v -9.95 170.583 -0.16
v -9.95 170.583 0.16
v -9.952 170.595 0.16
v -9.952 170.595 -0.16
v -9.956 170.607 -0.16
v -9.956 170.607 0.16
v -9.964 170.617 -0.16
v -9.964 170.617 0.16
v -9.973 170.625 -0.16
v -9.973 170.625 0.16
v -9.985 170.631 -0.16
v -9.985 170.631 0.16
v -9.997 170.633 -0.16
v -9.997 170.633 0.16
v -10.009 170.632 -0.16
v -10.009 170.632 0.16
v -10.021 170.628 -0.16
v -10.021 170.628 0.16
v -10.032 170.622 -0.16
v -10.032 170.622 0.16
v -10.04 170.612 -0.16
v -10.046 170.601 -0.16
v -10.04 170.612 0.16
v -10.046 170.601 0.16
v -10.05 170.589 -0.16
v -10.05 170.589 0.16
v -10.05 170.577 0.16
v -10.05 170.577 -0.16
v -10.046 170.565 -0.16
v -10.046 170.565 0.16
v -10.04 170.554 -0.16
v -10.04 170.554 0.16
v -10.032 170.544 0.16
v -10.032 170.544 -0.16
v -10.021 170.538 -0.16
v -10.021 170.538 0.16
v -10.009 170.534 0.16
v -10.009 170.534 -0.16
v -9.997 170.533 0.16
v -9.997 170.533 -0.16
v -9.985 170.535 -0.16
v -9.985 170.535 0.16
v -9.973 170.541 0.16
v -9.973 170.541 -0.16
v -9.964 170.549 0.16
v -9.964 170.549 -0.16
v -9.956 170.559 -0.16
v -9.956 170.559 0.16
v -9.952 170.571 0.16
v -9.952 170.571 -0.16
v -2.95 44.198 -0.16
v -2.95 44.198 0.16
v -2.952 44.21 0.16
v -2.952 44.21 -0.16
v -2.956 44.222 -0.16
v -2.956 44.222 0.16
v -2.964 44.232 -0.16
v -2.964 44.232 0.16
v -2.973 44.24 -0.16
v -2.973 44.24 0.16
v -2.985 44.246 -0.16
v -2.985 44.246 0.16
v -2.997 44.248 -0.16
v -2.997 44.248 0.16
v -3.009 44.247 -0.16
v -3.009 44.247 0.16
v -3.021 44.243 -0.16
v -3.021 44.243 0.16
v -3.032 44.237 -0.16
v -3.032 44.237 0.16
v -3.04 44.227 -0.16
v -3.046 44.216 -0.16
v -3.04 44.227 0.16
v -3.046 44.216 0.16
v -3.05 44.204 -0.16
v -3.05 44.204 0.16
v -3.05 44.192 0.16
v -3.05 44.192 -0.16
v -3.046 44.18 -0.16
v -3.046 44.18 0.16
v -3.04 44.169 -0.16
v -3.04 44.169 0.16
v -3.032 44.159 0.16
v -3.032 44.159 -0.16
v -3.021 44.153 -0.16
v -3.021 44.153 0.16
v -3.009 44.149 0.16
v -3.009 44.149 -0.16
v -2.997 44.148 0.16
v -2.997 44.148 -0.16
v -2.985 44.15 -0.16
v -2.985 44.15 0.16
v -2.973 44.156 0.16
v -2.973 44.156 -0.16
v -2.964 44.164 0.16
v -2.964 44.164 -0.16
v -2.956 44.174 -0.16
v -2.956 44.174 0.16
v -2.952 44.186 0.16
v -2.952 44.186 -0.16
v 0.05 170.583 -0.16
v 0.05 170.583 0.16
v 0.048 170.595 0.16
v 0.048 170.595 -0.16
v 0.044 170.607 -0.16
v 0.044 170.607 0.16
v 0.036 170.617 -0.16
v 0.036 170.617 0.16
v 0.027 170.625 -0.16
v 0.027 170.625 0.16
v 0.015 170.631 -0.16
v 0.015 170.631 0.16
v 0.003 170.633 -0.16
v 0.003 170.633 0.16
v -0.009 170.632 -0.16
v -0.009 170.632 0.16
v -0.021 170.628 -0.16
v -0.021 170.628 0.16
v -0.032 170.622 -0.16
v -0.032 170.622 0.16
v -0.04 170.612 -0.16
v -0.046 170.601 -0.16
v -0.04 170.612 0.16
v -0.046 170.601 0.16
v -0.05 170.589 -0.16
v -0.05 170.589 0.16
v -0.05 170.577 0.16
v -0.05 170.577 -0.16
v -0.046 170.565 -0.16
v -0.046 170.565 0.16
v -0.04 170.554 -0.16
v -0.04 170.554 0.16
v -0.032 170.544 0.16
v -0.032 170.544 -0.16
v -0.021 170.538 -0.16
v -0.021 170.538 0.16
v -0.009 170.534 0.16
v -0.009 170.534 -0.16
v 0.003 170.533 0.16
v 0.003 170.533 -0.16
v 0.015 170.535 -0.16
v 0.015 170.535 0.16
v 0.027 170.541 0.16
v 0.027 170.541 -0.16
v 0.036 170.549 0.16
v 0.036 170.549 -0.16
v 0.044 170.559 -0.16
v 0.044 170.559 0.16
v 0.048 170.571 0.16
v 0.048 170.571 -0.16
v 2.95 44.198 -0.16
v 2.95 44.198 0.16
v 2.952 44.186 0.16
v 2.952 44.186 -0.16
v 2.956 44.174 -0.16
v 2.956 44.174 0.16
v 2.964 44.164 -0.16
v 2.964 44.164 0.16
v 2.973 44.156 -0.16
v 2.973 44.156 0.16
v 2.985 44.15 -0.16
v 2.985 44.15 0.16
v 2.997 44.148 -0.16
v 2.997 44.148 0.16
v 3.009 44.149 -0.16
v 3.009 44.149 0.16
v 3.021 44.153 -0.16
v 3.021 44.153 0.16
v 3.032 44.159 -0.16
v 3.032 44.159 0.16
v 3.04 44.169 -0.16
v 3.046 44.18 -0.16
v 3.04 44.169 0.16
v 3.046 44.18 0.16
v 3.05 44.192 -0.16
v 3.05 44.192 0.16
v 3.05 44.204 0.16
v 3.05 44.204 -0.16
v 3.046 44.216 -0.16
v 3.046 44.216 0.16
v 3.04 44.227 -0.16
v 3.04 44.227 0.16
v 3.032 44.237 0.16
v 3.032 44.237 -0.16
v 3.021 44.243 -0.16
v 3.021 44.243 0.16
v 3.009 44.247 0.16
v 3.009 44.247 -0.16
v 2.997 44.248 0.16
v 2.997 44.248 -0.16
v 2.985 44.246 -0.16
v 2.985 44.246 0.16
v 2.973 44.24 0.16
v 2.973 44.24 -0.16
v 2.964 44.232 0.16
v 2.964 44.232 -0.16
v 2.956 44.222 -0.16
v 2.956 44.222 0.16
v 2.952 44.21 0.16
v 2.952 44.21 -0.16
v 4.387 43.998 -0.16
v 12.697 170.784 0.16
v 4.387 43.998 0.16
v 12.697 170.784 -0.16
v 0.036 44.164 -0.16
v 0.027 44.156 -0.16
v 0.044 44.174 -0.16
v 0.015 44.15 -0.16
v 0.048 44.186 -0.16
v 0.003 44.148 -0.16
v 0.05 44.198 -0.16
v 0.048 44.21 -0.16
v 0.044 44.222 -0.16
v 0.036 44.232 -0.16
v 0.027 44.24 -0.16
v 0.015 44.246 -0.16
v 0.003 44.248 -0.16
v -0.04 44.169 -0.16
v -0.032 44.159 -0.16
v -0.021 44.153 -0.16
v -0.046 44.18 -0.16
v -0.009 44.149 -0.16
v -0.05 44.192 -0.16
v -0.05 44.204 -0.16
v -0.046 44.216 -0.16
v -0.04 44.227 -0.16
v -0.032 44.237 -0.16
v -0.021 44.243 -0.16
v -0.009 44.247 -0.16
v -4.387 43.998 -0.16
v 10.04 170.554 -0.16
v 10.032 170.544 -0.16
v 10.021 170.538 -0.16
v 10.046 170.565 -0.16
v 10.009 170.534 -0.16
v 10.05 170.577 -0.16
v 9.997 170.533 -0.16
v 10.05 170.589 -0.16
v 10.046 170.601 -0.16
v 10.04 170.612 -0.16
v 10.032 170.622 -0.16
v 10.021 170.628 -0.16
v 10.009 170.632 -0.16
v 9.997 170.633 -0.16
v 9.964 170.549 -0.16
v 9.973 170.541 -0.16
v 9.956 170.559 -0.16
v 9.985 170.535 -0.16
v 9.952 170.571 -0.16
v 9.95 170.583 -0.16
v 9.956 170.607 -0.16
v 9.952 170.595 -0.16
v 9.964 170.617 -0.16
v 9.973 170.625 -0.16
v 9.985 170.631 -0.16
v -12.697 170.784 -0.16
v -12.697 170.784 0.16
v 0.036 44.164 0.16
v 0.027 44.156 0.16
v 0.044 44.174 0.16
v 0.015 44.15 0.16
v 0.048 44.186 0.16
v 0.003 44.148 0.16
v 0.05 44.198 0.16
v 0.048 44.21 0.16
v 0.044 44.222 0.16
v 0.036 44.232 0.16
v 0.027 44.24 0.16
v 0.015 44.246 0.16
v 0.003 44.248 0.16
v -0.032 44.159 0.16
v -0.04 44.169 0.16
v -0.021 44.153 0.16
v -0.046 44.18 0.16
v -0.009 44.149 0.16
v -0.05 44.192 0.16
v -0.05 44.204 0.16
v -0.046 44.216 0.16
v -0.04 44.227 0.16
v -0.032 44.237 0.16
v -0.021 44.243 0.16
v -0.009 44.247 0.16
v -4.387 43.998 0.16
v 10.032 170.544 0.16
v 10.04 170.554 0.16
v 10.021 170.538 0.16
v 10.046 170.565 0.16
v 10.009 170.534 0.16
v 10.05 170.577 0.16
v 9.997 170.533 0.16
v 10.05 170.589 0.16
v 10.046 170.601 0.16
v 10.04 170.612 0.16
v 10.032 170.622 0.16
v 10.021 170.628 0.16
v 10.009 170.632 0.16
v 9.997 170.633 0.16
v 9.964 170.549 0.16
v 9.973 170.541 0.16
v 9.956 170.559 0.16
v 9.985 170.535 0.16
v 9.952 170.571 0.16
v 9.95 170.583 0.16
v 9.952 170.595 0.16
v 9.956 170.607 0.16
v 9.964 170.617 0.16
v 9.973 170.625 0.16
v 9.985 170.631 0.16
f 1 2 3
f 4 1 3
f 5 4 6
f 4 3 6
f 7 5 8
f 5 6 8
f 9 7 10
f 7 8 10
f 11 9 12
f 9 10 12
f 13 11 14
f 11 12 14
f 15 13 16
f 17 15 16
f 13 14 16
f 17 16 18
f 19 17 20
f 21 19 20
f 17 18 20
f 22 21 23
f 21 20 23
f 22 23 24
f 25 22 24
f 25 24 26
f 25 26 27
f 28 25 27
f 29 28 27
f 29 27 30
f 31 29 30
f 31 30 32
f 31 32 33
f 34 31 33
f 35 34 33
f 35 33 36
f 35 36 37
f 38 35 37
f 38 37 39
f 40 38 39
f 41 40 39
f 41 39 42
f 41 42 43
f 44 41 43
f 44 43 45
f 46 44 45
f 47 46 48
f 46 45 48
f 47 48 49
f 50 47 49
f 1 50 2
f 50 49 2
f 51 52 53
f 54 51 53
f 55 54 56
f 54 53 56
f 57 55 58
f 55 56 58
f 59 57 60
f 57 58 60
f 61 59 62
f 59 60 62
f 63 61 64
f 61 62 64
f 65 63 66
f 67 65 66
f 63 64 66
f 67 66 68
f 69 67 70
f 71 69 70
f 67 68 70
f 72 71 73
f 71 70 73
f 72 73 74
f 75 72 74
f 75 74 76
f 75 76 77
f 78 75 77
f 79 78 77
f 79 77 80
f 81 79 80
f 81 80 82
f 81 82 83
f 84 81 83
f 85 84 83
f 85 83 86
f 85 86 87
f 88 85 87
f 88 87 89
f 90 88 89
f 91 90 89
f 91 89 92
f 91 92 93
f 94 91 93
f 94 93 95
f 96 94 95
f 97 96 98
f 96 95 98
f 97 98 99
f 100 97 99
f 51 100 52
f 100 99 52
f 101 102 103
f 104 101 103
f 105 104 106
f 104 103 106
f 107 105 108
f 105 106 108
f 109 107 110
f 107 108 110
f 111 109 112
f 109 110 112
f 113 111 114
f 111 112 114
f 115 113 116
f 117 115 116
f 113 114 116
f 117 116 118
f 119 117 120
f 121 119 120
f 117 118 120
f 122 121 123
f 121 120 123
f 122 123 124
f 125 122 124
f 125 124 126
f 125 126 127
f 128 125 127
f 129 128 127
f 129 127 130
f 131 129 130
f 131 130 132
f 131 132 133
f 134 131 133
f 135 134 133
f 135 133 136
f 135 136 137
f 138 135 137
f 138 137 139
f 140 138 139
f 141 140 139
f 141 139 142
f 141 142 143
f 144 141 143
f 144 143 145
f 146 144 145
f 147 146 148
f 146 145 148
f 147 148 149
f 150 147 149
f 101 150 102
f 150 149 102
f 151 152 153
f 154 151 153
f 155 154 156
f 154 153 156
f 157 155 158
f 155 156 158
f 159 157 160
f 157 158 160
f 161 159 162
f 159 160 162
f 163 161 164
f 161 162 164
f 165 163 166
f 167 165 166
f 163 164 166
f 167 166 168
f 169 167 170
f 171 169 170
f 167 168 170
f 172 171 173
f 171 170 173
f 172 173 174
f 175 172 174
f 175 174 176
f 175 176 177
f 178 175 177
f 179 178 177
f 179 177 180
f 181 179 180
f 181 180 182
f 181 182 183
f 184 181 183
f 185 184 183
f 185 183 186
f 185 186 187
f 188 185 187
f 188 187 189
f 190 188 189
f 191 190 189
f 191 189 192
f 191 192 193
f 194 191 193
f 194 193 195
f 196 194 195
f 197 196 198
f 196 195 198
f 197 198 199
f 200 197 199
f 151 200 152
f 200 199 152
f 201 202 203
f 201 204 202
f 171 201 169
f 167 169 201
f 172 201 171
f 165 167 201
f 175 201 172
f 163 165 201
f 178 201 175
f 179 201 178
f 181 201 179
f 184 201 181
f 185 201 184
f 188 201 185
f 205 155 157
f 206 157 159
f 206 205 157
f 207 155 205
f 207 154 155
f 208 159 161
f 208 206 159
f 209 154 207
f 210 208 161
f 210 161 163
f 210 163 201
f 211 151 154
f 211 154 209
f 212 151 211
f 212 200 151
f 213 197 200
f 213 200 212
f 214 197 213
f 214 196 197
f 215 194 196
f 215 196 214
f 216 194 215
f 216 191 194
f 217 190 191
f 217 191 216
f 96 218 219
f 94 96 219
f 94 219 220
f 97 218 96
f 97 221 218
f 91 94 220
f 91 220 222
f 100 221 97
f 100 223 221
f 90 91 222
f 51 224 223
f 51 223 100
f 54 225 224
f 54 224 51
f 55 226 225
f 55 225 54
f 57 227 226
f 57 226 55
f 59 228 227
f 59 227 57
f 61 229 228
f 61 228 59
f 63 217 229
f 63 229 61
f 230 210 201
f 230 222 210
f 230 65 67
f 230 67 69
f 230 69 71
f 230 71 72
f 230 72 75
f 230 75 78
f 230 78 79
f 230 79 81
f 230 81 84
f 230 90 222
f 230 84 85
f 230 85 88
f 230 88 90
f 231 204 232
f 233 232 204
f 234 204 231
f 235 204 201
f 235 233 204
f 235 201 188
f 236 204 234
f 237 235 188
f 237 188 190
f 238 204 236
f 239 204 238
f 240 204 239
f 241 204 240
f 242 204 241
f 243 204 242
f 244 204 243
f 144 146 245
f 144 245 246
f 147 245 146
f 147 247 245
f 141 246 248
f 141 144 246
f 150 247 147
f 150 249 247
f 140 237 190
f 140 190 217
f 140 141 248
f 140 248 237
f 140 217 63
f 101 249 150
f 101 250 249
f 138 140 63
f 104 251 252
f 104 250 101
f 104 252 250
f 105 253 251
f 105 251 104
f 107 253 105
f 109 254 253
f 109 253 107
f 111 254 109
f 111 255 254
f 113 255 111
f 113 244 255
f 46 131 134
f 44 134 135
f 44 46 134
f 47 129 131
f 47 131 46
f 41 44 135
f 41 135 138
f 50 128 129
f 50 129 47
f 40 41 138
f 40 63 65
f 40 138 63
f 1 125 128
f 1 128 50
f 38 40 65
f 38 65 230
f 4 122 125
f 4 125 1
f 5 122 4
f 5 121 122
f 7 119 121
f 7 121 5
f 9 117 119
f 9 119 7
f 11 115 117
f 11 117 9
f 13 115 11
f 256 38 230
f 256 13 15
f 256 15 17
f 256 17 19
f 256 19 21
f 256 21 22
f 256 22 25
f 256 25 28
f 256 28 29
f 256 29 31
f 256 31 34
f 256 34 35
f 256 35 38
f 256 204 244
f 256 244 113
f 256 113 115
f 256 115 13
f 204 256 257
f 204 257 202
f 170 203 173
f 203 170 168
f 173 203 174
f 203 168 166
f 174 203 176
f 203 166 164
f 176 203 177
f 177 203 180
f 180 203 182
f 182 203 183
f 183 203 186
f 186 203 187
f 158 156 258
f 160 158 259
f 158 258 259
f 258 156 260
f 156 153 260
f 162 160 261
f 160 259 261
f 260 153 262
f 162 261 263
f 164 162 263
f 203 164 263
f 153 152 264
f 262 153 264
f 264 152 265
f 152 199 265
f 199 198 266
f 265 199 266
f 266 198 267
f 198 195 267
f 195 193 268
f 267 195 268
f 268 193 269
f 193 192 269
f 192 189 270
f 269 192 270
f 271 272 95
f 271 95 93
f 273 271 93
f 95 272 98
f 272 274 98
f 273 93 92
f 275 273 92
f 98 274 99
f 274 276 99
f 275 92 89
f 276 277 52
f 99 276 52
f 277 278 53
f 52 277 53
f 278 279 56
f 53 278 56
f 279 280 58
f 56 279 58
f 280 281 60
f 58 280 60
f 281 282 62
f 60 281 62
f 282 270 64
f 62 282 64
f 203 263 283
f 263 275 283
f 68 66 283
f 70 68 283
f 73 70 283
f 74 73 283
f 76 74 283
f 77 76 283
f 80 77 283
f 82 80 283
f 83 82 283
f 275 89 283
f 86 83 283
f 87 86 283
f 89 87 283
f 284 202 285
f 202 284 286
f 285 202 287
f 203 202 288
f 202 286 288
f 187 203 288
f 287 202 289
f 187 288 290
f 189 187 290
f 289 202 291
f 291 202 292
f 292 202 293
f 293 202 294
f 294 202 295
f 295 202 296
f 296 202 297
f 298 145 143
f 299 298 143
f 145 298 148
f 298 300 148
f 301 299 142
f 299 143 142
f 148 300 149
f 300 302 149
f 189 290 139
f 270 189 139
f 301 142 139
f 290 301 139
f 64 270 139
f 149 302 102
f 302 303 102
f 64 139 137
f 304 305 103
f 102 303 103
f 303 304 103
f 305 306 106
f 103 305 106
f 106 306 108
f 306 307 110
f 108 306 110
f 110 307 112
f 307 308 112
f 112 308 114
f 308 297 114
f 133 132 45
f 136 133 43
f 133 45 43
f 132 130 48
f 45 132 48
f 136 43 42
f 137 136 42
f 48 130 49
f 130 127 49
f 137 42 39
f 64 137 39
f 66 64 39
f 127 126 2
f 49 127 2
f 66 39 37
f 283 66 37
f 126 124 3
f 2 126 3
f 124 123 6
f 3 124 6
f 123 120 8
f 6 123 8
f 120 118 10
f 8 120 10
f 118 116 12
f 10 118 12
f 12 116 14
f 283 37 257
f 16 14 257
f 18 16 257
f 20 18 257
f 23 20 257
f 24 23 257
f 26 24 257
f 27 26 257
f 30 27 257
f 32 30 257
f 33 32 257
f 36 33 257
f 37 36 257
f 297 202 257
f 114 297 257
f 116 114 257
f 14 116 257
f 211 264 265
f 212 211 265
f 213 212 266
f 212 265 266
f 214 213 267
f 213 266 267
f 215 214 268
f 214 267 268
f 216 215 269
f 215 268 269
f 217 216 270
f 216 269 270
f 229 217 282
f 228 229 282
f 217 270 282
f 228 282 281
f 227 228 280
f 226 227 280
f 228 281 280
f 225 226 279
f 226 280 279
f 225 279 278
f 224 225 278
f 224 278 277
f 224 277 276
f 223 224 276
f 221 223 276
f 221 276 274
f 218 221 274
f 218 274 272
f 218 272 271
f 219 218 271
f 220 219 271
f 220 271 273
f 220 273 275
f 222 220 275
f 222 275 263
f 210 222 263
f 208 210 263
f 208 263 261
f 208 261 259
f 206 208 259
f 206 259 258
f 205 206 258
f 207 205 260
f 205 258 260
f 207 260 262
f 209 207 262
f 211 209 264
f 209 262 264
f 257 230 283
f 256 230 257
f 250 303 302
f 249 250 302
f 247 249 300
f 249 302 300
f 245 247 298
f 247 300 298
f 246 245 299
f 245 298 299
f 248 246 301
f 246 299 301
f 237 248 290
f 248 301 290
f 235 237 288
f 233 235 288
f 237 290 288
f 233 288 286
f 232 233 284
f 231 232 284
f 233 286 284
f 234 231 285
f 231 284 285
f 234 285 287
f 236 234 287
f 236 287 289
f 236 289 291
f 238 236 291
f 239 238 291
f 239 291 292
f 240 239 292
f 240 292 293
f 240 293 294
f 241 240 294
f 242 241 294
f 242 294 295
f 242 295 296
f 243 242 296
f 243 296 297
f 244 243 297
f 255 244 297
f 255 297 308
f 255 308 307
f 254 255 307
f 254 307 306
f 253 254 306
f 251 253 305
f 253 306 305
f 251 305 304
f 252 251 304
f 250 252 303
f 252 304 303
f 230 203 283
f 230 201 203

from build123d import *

# Parameters (mm, degrees)
EXTRUDE1_DEPTH = 0.16
SKETCH2_R      = 0.05
EXTRUDE2_DEPTH = 1.32


with BuildPart() as part:
    # Sketch1 → Extrude1 (new body, symmetric)
    with BuildSketch(Plane(origin=(0, 0, 0), x_dir=(-1, 0, 0), z_dir=(0, 0, -1))):
        Polygon((-4.387, 43.998003308), (4.387, 43.998003308), (12.697, 170.784102838), (-12.697, 170.784102838), align=None)
    extrude(amount=EXTRUDE1_DEPTH, both=True)

    # Sketch2 → Extrude2 (cut, through all)
    with BuildSketch(Plane.XY.offset(0.16)):
        with Locations((-3, 44.198003308)):
            Circle(SKETCH2_R)
        with Locations((0, 44.198003308)):
            Circle(SKETCH2_R)
        with Locations(Location((3, 44.198003308, 0), (0, 0, 180))):  # turned: the seam where the file's is
            Circle(SKETCH2_R)
        with Locations((0, 170.583003308)):
            Circle(SKETCH2_R)
        with Locations((-10, 170.583003308)):
            Circle(SKETCH2_R)
        with Locations(Location((10, 170.583003308, 0), (0, 0, 180))):  # turned: the seam where the file's is
            Circle(SKETCH2_R)
    extrude(amount=-EXTRUDE2_DEPTH, mode=Mode.SUBTRACT)


solid = part.part
